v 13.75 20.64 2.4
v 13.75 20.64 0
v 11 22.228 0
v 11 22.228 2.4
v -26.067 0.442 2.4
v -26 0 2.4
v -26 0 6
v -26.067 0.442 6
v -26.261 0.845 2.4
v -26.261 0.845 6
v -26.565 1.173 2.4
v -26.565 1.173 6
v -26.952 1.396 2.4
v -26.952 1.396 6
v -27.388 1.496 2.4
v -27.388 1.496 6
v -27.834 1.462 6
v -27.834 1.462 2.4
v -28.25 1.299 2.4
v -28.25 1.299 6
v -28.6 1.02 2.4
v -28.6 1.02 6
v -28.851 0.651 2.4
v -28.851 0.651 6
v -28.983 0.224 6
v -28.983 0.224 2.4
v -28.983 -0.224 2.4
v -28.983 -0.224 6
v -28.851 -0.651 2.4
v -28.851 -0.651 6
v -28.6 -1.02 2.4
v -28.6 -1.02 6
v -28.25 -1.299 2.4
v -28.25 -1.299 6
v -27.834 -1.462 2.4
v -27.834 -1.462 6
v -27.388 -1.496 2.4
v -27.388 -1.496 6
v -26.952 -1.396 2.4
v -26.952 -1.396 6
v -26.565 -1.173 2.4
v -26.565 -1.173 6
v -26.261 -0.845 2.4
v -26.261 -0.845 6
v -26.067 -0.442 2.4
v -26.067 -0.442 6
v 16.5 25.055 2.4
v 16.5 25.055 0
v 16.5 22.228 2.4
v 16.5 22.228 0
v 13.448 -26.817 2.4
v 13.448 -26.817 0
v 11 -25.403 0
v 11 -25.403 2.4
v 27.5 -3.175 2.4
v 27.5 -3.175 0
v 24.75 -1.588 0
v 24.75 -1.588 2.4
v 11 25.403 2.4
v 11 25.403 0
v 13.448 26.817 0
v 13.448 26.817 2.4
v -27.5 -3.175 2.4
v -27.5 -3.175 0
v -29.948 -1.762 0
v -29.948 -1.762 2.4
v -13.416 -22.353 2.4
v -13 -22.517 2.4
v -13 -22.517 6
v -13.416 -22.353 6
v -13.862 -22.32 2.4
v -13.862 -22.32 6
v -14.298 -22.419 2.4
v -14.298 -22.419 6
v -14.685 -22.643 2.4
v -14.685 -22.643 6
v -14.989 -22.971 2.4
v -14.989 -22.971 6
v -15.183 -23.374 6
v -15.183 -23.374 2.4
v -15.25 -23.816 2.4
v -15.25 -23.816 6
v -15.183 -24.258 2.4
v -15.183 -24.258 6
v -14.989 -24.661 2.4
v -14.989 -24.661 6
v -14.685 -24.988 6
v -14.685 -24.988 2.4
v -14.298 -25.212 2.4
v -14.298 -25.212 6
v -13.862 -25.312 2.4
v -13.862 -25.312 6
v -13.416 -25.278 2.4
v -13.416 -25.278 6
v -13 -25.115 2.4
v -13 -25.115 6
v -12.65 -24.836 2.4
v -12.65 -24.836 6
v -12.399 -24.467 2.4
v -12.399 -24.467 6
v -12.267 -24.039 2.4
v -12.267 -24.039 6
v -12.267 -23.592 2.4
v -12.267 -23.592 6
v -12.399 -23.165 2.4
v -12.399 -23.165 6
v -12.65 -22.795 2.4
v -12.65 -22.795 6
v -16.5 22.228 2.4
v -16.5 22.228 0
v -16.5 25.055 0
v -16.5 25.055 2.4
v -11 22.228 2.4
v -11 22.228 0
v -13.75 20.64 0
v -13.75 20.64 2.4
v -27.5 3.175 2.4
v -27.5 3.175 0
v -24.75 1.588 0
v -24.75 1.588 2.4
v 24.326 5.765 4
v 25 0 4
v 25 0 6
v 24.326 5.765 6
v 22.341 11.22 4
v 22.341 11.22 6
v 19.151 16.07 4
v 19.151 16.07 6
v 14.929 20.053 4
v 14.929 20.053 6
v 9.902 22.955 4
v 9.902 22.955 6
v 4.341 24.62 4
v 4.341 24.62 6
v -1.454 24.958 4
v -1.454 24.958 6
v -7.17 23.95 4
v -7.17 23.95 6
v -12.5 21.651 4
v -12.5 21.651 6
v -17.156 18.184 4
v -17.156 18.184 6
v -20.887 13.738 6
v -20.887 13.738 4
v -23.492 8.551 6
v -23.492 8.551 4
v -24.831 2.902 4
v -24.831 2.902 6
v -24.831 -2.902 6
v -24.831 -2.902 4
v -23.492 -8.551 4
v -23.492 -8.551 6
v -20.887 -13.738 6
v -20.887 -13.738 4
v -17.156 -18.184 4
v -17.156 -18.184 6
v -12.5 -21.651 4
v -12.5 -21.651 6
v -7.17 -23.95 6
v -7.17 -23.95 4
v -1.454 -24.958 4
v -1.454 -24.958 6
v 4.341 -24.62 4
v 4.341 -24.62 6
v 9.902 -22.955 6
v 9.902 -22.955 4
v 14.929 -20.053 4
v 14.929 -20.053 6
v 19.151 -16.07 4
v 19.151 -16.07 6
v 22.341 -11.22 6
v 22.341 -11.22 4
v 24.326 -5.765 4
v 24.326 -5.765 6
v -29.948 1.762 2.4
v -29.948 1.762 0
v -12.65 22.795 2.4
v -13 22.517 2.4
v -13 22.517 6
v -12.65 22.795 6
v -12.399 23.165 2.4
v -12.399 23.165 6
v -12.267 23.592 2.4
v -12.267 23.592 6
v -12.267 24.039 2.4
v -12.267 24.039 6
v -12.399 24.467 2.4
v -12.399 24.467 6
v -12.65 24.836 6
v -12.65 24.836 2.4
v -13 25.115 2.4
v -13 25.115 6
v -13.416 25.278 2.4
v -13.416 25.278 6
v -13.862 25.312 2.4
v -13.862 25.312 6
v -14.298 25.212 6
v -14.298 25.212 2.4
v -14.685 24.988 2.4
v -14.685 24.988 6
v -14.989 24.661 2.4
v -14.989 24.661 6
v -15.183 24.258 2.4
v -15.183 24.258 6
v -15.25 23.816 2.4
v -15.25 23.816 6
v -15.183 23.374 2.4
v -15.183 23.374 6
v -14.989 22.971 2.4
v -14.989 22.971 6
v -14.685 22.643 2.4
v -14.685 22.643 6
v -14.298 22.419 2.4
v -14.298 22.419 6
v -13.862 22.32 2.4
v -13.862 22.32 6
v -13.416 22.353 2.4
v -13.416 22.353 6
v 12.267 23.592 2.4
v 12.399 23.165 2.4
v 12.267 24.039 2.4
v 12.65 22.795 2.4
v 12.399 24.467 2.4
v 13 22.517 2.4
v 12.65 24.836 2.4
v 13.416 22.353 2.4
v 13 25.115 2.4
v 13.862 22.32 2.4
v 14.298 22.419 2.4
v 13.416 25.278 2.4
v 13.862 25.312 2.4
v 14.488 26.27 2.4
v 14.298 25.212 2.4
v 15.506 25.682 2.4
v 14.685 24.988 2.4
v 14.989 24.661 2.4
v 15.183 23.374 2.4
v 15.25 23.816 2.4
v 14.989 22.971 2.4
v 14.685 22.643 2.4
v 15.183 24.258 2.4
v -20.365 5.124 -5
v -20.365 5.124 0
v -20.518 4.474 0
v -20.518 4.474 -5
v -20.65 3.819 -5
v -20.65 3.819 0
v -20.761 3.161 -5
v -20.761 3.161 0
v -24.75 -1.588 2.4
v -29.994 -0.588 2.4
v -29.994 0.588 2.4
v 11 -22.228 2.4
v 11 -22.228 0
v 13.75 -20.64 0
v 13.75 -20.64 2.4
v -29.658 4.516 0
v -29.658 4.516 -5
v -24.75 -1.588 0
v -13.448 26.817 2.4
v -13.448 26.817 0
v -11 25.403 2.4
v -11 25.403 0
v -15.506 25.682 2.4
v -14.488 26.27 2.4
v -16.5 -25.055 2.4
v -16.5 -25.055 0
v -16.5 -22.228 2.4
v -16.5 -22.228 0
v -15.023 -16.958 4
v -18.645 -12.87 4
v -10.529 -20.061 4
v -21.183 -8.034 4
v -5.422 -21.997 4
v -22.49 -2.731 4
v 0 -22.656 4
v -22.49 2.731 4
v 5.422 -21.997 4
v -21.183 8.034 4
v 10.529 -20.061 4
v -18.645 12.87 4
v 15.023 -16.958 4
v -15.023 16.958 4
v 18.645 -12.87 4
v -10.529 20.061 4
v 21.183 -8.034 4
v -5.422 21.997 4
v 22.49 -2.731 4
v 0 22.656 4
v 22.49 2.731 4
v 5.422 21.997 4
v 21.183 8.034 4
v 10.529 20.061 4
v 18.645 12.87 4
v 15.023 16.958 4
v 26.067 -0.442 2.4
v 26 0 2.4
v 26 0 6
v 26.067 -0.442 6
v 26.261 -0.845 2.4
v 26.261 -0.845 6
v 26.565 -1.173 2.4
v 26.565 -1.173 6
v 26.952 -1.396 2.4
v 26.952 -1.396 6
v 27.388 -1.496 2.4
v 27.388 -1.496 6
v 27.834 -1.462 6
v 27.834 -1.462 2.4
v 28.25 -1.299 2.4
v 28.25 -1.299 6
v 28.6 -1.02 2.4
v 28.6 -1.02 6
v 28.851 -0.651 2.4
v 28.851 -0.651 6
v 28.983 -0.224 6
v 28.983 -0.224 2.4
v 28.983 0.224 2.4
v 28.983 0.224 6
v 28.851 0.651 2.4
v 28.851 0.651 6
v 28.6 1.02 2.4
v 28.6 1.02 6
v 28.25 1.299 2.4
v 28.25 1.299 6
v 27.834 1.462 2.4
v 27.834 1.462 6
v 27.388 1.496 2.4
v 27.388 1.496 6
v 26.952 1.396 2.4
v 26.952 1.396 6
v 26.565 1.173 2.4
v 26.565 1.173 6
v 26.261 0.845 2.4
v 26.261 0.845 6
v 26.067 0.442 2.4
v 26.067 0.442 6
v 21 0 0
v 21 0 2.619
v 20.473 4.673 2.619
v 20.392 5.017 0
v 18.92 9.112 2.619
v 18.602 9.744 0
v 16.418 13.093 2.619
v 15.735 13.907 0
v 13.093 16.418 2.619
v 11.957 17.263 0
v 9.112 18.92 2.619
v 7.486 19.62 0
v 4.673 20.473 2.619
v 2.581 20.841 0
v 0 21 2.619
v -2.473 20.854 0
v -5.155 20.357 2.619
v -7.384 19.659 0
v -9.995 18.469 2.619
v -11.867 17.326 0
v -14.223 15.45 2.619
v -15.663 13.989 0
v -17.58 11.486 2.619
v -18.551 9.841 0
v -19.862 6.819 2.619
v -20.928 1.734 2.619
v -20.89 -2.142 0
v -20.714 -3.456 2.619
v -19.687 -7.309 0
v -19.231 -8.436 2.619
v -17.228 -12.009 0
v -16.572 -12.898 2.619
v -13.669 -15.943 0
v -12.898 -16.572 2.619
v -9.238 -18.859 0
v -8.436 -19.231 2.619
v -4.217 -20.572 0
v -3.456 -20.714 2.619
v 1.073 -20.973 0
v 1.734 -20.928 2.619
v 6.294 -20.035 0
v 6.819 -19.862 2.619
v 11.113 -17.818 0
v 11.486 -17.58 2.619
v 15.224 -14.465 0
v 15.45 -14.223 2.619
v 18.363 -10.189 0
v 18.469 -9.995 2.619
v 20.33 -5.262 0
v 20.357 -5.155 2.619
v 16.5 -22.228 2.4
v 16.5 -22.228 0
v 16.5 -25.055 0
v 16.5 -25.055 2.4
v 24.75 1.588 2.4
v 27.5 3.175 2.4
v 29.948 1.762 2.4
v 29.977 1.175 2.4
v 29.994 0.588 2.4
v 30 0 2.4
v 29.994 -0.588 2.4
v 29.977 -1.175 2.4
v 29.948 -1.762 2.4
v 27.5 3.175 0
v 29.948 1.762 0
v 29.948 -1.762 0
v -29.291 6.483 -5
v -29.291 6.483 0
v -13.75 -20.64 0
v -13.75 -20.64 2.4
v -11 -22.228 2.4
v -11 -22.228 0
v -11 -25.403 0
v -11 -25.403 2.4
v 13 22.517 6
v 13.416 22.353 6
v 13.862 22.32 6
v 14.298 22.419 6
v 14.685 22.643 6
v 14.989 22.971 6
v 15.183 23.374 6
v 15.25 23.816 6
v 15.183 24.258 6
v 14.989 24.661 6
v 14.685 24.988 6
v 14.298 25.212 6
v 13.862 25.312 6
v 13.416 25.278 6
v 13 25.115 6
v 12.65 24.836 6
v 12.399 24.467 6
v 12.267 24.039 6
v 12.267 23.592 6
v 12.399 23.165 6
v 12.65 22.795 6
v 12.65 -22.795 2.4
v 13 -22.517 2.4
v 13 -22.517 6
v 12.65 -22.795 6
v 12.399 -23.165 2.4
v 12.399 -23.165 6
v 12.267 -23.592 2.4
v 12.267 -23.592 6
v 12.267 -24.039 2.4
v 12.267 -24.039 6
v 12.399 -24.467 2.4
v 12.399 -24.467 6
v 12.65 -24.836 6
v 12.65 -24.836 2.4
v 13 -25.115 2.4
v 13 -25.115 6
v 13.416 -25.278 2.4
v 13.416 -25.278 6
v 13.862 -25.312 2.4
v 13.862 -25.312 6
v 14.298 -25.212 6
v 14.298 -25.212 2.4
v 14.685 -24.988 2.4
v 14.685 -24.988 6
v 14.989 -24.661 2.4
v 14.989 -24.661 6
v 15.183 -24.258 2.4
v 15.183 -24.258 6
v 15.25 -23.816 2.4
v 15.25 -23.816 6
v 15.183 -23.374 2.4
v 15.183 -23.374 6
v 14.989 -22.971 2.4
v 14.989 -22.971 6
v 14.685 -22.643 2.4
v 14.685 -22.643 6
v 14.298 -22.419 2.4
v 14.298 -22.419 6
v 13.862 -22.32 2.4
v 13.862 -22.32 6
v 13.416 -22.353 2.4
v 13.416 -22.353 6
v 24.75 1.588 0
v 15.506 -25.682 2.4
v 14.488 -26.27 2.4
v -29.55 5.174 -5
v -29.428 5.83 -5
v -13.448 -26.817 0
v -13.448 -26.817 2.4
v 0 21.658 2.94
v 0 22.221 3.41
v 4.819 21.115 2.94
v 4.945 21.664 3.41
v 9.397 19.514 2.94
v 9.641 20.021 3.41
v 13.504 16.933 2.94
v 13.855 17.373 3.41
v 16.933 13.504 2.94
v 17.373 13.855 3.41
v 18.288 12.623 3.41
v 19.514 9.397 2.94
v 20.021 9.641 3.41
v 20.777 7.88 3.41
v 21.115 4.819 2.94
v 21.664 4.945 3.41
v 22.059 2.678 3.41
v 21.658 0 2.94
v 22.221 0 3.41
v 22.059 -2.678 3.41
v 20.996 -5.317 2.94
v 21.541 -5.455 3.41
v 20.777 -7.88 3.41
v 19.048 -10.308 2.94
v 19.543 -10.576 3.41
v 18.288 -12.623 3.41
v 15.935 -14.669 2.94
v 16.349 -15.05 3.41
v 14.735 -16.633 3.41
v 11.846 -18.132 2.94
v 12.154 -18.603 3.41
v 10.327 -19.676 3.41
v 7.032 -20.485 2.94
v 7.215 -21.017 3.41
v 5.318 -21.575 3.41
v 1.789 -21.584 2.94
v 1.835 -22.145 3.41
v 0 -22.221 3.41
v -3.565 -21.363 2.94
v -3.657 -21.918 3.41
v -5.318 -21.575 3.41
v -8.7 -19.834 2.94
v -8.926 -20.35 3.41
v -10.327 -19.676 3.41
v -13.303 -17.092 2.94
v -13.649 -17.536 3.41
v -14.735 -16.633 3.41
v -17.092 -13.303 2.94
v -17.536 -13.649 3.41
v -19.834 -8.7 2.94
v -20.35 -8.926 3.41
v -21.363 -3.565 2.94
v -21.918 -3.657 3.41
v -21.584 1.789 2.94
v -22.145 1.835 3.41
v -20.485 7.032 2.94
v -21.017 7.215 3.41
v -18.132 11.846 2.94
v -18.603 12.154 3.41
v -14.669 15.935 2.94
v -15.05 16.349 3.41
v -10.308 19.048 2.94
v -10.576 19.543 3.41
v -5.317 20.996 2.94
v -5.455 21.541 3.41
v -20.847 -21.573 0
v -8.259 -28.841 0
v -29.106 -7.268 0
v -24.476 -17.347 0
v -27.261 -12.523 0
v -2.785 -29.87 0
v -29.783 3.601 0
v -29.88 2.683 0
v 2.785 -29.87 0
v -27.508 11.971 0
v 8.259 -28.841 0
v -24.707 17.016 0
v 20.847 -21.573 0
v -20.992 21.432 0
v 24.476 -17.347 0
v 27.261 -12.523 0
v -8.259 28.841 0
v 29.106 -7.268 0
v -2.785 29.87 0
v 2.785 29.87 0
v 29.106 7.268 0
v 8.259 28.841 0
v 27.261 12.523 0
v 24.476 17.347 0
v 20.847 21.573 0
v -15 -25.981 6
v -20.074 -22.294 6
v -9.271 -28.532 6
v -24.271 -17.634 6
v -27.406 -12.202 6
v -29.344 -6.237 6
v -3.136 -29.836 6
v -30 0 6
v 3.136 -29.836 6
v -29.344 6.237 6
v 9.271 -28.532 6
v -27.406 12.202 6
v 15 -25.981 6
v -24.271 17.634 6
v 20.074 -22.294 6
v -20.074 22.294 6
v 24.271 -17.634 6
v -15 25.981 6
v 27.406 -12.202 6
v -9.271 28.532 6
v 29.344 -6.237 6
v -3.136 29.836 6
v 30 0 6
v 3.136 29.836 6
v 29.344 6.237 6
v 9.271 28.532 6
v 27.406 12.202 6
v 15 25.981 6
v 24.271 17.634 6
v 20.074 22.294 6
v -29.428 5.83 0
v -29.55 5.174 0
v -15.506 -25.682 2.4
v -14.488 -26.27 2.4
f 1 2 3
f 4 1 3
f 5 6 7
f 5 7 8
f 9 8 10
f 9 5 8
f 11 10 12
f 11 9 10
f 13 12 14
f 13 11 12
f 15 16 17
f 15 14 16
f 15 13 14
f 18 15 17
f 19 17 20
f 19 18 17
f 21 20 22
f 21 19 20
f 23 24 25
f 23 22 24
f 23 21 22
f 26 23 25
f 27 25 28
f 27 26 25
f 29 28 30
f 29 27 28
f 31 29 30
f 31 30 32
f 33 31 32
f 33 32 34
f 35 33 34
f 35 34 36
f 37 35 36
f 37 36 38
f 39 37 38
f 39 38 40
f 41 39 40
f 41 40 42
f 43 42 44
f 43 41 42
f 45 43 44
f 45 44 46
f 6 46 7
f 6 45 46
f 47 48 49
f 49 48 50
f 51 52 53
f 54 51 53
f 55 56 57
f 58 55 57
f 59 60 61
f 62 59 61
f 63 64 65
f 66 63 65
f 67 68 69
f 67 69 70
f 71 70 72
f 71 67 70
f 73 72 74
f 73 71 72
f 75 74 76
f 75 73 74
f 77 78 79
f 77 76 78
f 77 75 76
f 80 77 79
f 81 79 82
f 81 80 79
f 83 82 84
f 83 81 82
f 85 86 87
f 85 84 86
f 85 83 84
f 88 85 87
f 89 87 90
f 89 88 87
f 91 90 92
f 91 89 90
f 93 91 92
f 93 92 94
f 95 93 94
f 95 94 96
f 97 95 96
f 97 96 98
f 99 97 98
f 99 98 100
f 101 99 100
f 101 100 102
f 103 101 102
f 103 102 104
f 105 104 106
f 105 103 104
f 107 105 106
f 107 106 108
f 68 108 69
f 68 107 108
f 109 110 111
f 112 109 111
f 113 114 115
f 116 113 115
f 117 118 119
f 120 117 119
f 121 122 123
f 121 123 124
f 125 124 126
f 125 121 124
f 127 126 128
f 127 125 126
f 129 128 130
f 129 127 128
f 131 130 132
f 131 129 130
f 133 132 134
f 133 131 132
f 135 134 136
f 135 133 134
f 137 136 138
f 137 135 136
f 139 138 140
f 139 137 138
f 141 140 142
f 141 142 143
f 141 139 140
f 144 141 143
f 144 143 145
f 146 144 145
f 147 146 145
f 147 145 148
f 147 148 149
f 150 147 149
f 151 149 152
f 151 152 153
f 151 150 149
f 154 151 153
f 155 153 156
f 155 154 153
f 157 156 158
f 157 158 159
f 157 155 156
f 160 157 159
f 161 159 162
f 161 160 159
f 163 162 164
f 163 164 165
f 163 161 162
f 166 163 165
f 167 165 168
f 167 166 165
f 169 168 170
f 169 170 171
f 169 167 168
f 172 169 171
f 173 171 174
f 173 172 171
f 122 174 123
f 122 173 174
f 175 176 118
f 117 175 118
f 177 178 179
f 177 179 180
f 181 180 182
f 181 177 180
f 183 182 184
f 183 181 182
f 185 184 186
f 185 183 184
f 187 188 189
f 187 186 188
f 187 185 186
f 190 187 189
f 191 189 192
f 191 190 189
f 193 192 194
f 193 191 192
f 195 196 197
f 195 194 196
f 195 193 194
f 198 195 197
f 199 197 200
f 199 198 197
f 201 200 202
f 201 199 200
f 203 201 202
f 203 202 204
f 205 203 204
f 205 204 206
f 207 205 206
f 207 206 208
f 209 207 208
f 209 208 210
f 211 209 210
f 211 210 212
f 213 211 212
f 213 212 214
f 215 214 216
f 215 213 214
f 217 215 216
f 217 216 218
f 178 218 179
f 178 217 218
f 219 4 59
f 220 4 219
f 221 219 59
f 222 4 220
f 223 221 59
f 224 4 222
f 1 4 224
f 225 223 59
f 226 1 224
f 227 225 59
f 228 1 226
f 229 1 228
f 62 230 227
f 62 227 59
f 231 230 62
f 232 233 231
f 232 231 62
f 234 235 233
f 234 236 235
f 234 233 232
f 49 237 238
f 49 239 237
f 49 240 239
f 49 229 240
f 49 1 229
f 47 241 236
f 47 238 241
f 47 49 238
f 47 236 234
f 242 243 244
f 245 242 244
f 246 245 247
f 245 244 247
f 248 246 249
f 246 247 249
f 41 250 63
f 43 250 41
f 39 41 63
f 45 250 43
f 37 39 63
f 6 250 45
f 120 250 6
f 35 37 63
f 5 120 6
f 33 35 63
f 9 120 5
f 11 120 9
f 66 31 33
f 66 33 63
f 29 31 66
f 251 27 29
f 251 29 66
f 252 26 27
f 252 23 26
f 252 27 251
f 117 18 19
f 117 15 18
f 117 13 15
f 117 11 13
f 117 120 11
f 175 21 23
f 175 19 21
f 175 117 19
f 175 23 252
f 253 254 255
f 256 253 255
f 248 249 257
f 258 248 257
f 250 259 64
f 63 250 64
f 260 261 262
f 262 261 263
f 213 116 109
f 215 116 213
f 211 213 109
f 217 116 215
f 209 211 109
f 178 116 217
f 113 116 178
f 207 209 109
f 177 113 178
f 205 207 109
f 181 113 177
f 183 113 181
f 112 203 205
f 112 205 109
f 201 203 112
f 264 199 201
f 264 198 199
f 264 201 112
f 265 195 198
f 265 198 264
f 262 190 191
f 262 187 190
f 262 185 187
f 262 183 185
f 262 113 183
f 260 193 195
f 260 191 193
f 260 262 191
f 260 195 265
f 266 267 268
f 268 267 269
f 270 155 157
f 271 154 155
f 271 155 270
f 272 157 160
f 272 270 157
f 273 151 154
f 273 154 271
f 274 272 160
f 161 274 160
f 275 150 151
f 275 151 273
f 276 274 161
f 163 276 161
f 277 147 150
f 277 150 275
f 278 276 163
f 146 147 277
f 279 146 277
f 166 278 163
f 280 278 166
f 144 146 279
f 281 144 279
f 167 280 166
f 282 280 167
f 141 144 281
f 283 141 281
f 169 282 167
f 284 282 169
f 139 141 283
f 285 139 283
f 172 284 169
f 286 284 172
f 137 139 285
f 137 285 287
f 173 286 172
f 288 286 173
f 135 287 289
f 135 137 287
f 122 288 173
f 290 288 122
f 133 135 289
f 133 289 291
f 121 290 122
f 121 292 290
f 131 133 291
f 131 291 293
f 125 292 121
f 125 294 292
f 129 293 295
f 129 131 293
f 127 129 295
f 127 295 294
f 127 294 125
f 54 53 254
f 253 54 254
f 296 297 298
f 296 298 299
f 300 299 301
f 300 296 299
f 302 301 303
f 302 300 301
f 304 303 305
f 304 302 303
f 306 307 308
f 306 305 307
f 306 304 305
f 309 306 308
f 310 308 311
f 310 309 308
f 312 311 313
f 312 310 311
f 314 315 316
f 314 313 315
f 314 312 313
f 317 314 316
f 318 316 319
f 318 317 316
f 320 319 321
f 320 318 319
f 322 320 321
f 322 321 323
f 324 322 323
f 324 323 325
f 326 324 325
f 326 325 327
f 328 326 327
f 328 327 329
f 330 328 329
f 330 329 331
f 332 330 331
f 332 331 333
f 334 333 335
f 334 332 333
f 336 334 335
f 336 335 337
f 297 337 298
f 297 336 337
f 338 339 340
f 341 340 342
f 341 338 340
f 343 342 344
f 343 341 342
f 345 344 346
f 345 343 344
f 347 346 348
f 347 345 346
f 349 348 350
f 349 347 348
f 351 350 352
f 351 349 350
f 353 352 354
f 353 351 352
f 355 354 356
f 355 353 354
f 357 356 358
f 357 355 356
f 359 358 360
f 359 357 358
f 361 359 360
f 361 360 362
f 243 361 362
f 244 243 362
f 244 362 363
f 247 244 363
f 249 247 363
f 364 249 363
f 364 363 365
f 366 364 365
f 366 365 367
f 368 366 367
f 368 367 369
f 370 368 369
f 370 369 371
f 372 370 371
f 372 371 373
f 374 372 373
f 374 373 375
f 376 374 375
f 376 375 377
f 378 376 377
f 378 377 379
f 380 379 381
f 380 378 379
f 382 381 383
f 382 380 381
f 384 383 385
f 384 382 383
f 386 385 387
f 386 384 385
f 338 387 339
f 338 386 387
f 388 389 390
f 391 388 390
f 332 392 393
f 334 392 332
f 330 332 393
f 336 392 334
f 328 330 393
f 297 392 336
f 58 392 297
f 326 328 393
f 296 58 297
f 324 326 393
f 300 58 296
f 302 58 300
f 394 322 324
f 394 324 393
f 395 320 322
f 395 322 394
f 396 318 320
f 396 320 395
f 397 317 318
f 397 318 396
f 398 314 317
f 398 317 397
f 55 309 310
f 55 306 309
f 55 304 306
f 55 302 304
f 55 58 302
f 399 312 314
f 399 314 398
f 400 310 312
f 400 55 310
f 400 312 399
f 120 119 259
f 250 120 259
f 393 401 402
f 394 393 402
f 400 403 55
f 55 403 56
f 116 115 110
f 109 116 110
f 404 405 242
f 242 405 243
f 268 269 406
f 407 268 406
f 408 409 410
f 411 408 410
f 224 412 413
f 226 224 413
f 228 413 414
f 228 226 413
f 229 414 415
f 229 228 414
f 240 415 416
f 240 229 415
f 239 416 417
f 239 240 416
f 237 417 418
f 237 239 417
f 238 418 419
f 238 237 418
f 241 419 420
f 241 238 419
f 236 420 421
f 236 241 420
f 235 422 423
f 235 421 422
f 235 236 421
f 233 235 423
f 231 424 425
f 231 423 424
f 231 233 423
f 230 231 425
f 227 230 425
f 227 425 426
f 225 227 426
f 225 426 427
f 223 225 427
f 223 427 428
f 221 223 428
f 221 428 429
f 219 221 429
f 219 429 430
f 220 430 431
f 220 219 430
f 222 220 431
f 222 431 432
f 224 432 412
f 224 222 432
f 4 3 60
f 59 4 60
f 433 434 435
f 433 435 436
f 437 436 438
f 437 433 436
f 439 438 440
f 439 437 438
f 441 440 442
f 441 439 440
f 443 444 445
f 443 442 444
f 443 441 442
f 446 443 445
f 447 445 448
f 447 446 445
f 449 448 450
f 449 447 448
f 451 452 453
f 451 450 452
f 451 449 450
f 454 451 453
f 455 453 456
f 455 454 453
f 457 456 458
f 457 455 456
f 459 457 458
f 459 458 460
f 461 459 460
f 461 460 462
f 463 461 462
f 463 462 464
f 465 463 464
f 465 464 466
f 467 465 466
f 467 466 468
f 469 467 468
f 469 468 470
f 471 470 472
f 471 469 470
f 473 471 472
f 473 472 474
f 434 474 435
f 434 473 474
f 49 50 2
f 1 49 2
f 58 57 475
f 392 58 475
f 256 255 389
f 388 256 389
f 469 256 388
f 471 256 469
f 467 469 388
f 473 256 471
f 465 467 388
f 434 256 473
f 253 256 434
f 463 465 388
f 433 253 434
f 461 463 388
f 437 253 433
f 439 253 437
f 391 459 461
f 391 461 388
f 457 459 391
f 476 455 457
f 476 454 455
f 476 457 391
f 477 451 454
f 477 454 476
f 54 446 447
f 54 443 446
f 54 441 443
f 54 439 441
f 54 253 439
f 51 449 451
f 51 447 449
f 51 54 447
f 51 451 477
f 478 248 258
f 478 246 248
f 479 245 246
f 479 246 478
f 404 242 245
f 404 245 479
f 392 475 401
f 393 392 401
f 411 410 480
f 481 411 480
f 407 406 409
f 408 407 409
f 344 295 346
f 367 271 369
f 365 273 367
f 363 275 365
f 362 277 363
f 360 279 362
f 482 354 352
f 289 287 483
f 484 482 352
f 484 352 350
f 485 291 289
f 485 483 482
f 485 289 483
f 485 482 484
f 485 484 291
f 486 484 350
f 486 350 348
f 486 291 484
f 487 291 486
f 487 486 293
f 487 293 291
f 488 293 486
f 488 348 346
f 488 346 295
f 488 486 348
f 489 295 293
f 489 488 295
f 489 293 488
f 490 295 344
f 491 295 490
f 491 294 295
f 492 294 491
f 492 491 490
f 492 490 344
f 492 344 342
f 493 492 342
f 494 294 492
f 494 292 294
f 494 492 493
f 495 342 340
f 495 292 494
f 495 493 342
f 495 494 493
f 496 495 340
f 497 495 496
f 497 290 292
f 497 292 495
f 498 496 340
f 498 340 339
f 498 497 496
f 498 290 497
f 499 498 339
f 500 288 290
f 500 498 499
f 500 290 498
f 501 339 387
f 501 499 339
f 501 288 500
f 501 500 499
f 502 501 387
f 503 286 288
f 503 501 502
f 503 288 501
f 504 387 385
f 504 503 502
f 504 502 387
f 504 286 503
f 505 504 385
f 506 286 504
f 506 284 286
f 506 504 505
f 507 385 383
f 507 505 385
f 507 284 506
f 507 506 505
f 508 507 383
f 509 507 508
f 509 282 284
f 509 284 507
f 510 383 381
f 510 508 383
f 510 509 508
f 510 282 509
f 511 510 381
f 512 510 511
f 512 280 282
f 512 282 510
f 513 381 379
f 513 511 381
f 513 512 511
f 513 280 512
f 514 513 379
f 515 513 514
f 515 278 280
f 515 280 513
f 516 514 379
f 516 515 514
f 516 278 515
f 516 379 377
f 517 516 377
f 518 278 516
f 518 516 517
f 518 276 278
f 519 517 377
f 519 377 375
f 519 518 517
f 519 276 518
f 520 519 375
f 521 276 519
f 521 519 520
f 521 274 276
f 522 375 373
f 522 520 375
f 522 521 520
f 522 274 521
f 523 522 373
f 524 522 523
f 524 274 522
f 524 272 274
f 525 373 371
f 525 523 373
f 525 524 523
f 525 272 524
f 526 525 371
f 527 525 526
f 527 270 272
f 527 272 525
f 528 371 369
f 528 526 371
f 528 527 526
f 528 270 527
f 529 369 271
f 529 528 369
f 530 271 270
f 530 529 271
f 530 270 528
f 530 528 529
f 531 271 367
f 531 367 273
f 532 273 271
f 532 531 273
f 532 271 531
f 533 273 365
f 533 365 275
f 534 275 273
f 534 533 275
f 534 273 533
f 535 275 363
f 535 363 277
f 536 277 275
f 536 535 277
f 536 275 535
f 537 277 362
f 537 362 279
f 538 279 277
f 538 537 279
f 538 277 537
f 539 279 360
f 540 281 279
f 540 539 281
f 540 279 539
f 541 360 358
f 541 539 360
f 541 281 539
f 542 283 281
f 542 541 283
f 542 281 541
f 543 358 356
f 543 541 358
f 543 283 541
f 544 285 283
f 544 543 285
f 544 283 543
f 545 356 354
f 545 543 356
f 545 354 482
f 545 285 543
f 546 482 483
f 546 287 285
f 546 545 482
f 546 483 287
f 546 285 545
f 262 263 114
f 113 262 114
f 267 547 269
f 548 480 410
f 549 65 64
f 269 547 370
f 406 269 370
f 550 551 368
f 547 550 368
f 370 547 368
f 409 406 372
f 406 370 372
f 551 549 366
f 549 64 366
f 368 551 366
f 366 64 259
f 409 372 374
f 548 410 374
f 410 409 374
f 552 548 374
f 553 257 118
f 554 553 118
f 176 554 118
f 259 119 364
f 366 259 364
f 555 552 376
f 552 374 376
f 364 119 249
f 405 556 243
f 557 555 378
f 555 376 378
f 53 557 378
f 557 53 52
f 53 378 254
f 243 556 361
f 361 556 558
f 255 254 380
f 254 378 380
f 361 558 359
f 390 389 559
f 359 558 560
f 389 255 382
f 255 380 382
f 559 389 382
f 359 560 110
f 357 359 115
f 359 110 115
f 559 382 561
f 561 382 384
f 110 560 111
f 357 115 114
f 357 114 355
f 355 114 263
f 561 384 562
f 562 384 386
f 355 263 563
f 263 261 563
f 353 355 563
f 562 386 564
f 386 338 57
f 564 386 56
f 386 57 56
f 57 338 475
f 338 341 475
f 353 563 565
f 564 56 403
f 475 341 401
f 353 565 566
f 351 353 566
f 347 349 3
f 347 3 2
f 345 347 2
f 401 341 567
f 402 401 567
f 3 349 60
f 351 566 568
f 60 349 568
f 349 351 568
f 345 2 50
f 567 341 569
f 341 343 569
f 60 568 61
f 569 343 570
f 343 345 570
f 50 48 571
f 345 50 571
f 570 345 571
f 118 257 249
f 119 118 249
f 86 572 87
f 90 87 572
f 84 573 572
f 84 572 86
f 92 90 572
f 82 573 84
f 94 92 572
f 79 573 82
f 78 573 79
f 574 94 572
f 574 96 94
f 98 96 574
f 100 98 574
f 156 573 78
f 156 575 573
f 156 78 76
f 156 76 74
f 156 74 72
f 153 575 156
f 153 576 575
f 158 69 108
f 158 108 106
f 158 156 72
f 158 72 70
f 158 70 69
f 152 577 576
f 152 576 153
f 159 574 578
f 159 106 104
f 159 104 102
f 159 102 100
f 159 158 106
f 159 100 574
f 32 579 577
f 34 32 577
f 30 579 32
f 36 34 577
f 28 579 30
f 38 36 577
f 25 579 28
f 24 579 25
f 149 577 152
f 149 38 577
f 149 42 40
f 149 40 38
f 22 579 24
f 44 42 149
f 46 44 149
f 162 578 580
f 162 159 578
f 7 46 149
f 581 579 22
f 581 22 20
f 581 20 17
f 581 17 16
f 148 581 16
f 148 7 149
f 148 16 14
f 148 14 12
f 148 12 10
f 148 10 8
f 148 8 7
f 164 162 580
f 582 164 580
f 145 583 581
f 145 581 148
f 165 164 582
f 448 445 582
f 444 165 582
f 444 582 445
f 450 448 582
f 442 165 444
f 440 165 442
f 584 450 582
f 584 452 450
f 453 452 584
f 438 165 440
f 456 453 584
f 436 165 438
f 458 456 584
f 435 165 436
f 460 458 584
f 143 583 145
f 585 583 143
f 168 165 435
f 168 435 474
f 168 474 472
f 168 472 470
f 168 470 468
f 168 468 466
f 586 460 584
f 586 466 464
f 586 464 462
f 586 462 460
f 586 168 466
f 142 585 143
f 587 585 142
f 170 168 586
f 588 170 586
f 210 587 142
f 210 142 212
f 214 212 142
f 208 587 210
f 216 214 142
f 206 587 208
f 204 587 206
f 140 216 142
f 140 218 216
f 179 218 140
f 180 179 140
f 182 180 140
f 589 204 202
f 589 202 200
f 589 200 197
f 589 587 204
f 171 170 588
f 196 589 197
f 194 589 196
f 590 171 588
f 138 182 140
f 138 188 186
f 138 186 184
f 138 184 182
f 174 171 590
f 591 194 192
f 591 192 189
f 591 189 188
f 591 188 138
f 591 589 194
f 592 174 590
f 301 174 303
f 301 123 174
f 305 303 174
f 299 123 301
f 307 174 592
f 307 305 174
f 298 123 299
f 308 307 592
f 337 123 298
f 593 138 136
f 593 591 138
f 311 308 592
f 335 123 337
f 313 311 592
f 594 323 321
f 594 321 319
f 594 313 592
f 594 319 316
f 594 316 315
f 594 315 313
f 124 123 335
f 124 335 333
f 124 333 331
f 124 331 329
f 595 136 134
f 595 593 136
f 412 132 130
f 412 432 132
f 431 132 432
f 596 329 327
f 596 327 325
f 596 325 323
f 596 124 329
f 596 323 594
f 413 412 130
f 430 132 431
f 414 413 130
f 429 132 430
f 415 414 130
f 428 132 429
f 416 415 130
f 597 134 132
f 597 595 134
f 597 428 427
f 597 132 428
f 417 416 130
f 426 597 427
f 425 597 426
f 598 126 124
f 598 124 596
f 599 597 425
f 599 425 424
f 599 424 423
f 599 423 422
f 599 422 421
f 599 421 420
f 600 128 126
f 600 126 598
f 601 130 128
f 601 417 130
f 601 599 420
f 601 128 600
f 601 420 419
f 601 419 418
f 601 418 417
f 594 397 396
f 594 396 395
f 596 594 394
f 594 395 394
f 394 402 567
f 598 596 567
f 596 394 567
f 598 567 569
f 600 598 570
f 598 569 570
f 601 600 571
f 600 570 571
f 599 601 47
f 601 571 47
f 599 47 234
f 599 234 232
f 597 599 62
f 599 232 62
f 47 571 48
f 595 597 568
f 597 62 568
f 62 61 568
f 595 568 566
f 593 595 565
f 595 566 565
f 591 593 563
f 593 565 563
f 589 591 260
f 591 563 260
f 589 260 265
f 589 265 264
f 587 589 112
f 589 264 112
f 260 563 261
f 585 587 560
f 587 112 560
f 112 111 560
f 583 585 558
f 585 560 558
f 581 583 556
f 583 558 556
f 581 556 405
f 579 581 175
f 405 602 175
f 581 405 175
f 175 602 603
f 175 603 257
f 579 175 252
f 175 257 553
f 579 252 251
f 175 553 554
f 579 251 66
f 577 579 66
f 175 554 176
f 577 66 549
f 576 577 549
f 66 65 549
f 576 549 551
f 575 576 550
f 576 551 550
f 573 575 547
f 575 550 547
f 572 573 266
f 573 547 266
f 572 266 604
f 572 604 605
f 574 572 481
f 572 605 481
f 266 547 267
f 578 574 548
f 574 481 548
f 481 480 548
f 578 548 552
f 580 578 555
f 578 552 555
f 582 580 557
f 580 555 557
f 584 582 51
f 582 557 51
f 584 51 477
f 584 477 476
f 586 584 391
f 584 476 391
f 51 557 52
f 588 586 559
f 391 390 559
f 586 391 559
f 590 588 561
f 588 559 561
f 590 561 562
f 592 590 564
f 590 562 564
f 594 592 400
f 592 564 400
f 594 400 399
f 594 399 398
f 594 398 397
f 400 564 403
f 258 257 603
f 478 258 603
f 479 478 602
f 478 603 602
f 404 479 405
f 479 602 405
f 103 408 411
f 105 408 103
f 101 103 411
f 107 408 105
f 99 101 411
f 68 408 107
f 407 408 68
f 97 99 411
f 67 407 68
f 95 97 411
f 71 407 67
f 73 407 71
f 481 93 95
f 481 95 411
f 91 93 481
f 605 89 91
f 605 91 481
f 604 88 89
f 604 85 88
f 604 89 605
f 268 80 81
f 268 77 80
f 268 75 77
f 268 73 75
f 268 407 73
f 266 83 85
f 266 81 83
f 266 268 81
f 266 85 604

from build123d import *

# Parameters (mm, degrees)
SCHIZZO1_R                   = 30
SCHIZZO1_R_2                 = 21
ESTRUSIONE_ESTRUSIONE1_DEPTH = 4
SCHIZZO2_R                   = 3.05
SCHIZZO3_R                   = 30
SCHIZZO3_R_2                 = 25
ESTRUSIONE_ESTRUSIONE2_DEPTH = 2
TAGLIO_ESTRUSIONE1_START     = -1
SCHIZZO4_R                   = 1.5
TAGLIO_ESTRUSIONE1_DEPTH     = 8
TAGLIO_ESTRUSIONE2_DEPTH     = 2.4
RIPETIZIONECIRCOLARE1_COUNT  = 6
ESTRUSIONE_ESTRUSIONE3_DEPTH = 5


with BuildPart() as part:
    # Schizzo1 → Estrusione-Estrusione1 (new body)
    with BuildSketch(Plane.XY):
        Circle(SCHIZZO1_R)
        Circle(SCHIZZO1_R_2, mode=Mode.SUBTRACT)
    extrude(amount=ESTRUSIONE_ESTRUSIONE1_DEPTH)

    # Schizzo2 → Taglia-Rivoluzione1 (revolve, cut)
    with BuildSketch(Plane(origin=(0, 0, 0), x_dir=(0, 0, -1), z_dir=(1, 0, 0))):
        with Locations((-5.5, 20)):
            Circle(SCHIZZO2_R)
    revolve(axis=Axis((0, 0, 4), (0, 0, -1)), mode=Mode.SUBTRACT)

    # Schizzo3 → Estrusione-Estrusione2 (add)
    with BuildSketch(Plane.XY.offset(4)):
        Circle(SCHIZZO3_R)
        Circle(SCHIZZO3_R_2, mode=Mode.SUBTRACT)
    extrude(amount=ESTRUSIONE_ESTRUSIONE2_DEPTH)

    # Schizzo4 → Taglio-Estrusione1 (cut)
    with BuildSketch(Plane.XY.offset(TAGLIO_ESTRUSIONE1_START)):
        with Locations((-27.5, 0)):
            Circle(SCHIZZO4_R)
    taglio_estrusione1 = extrude(amount=TAGLIO_ESTRUSIONE1_DEPTH, mode=Mode.SUBTRACT)

    # Schizzo5 → Taglio-Estrusione2 (cut)
    with BuildSketch(Plane(origin=(0, 0, 0), x_dir=(-1, 0, 0), z_dir=(0, 0, -1))):
        Polygon((30.25, 1.58771324), (27.5, 3.175426481), (24.75, 1.58771324), (24.75, -1.58771324), (27.5, -3.175426481), (30.25, -1.58771324), align=None)
    taglio_estrusione2 = extrude(amount=-TAGLIO_ESTRUSIONE2_DEPTH, mode=Mode.SUBTRACT)

    # RipetizioneCircolare1: Taglio-Estrusione1, Taglio-Estrusione2 ×6 about axis
    ripetizionecircolare1_axis = Axis((0, 0, 0), (0, 0, 1))
    for i in range(1, RIPETIZIONECIRCOLARE1_COUNT):
        add(taglio_estrusione1.rotate(ripetizionecircolare1_axis, i * 360 / RIPETIZIONECIRCOLARE1_COUNT), mode=Mode.SUBTRACT)
        add(taglio_estrusione2.rotate(ripetizionecircolare1_axis, i * 360 / RIPETIZIONECIRCOLARE1_COUNT), mode=Mode.SUBTRACT)

    # Schizzo6 → Estrusione-Estrusione3 (add)
    with BuildSketch(Plane(origin=(0, 0, 0), x_dir=(-1, 0, 0), z_dir=(0, 0, -1))):
        with BuildLine():
            Line((20.760752105, 3.160881527), (29.658217293, 4.515545038))
            ThreePointArc((29.658217293, 4.515545038), (29.491115616, 5.50219045), (29.291200414, 6.482713806))
            Line((29.291200414, 6.482713806), (20.365348226, 5.123728295))
            ThreePointArc((20.365348226, 5.123728295), (20.586457295, 4.147020139), (20.760752105, 3.160881527))
        make_face()
    extrude(amount=ESTRUSIONE_ESTRUSIONE3_DEPTH)


solid = part.part
